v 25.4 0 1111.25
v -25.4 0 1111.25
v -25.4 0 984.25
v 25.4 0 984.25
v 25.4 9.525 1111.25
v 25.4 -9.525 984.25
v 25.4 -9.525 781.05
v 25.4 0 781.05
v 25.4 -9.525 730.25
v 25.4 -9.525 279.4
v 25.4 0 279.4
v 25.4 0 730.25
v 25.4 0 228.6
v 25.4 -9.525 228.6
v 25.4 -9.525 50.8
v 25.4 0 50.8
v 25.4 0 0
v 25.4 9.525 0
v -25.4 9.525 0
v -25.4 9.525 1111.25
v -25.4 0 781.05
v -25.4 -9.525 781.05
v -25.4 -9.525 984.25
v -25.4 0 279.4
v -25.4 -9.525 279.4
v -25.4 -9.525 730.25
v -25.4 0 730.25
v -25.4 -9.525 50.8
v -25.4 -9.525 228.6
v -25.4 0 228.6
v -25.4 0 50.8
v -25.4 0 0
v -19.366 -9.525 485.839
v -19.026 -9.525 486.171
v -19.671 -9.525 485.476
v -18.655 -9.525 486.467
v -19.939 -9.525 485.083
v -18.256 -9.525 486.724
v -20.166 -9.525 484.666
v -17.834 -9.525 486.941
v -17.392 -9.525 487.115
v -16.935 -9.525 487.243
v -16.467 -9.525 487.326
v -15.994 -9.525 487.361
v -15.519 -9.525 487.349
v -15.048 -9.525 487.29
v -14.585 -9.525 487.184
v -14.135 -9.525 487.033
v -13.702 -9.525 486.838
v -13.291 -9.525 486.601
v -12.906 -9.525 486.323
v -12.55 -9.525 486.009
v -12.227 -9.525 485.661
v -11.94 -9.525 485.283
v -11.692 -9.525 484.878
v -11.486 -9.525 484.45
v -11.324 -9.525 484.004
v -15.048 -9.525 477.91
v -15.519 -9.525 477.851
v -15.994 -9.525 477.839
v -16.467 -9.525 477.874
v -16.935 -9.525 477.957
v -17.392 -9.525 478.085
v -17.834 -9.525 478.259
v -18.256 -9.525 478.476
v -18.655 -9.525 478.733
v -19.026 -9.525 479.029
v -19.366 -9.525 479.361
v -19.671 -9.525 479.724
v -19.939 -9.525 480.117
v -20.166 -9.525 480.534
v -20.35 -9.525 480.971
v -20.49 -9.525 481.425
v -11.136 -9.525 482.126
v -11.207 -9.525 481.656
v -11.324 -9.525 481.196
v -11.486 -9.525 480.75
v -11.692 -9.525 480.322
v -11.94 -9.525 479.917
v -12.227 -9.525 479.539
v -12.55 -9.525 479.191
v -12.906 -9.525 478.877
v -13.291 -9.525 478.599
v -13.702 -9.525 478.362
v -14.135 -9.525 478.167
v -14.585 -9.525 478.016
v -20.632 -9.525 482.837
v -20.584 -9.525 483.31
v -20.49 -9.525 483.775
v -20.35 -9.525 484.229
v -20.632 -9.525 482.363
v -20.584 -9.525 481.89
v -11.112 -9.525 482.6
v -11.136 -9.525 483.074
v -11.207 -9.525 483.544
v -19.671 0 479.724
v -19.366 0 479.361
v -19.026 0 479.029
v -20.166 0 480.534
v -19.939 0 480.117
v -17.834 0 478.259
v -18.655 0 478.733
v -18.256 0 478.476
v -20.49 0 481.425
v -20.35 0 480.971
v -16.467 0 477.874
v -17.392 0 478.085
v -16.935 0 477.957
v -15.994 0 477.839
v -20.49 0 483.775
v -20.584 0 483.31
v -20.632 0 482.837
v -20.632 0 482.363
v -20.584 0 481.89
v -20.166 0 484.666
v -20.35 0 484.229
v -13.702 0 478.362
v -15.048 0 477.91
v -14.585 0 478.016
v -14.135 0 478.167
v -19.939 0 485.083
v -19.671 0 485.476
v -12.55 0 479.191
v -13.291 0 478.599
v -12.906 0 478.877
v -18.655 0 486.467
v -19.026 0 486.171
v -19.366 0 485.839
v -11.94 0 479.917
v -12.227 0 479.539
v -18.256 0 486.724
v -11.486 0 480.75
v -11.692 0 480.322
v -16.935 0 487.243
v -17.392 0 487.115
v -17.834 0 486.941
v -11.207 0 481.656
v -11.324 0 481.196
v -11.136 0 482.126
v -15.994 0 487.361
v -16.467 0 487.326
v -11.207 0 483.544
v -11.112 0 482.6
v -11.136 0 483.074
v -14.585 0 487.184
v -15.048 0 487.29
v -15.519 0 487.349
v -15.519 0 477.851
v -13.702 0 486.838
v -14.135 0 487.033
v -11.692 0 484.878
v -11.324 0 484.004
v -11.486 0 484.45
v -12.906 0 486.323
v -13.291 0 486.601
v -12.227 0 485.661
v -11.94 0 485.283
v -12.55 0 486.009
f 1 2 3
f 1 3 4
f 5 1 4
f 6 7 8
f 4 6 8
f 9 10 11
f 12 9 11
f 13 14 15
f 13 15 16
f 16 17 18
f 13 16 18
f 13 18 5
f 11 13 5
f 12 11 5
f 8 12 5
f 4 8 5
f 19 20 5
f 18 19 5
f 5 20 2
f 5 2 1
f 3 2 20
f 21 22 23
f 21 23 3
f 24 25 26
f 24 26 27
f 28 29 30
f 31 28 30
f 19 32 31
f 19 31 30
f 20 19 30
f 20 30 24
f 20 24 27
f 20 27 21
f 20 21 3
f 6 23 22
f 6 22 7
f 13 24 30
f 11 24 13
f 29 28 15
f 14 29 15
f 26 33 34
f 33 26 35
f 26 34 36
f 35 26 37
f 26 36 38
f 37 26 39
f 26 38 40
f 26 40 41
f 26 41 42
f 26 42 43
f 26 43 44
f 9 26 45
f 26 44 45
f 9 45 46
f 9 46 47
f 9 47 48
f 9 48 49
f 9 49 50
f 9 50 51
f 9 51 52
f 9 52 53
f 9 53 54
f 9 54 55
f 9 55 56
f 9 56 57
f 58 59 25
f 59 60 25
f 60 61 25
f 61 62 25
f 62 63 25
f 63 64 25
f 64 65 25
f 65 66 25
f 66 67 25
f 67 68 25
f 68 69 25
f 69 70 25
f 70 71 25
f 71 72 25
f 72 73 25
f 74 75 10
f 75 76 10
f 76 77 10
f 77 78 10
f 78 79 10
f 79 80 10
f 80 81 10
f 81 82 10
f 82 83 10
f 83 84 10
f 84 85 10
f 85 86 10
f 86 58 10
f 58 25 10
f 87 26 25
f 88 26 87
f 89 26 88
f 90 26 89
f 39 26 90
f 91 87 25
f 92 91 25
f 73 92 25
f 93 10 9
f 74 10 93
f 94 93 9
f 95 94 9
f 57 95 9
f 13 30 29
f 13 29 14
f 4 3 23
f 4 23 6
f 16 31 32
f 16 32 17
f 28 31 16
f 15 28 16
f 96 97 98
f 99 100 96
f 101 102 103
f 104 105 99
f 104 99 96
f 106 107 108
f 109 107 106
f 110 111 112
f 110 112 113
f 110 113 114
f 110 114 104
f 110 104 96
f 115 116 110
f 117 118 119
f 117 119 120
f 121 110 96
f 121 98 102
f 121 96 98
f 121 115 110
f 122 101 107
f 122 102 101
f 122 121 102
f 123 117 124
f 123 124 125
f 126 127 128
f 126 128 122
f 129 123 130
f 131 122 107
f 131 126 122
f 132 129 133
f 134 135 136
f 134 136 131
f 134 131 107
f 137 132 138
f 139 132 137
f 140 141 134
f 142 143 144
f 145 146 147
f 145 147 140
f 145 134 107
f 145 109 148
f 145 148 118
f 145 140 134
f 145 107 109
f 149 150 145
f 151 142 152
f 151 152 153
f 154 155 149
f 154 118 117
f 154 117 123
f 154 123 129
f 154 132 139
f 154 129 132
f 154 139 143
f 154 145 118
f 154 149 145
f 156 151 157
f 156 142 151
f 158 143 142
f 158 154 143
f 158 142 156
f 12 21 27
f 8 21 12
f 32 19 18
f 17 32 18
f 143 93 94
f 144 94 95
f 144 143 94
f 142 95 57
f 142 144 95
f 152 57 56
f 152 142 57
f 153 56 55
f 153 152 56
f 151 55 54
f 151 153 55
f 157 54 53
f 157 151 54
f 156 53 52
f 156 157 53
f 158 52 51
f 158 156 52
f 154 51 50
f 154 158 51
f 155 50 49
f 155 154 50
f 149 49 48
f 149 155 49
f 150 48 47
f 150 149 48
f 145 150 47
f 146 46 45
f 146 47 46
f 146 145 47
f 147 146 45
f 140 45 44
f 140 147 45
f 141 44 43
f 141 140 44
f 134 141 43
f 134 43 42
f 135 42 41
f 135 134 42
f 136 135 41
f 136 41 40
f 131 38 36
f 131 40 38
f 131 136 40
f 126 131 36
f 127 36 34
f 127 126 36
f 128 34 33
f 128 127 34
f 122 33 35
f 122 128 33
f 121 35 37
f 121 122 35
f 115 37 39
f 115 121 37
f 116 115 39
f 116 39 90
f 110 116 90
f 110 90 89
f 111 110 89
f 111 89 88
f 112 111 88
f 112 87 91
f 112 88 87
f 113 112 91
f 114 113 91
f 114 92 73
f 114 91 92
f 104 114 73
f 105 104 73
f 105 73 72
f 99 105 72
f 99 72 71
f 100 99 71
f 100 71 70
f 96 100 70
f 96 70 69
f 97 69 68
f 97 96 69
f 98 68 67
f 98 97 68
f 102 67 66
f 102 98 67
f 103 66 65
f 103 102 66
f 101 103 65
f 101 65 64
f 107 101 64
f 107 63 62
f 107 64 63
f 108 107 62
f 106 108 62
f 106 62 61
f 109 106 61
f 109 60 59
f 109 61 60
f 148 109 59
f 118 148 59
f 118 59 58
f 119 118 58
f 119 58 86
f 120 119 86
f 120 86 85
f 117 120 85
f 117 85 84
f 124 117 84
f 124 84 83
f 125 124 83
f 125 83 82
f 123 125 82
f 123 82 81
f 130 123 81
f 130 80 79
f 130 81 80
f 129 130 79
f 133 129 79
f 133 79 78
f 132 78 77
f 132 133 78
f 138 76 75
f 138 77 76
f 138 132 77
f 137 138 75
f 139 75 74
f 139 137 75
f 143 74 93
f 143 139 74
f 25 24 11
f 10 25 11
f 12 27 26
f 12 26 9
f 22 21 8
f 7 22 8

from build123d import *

# Parameters (mm, degrees)
F0_W     = 50.8
F0_H     = 19.05
F1_DEPTH = 1111.25
F2_W     = 122.435573
F2_H     = 50.8
F2_W_2   = 93.867282
F2_W_3   = 343.160421
F2_H_2   = 127
F2_W_4   = 239.549167
F3_DEPTH = 25.4
F4_R     = 4.7625
F5_DEPTH = 25.4


with BuildPart() as f1:
    # F0 (on Top) → F1 (new body)
    with BuildSketch(Plane.XY):
        Rectangle(F0_W, F0_H)
    extrude(amount=F1_DEPTH)

    # F2 (on Front) → F3 (cut)
    with BuildSketch(Plane.XZ):
        with Locations((22.446524, 25.4)):
            Rectangle(F2_W, F2_H)
        with Locations((2.720783, 755.65)):
            Rectangle(F2_W_2, F2_H)
        with Locations((-38.781822, 1047.75)):
            Rectangle(F2_W_3, F2_H_2)
        with Locations((-25.794175, 254)):
            Rectangle(F2_W_4, F2_H)
    extrude(amount=F3_DEPTH, mode=Mode.SUBTRACT)

    # F4 (on Front) → F5 (cut)
    with BuildSketch(Plane.XZ):
        with Locations((-15.875, 254)):
            Circle(F4_R)
        with Locations((-15.875, 482.6)):
            Circle(F4_R)
    extrude(amount=F5_DEPTH, mode=Mode.SUBTRACT)


solid = f1.part
